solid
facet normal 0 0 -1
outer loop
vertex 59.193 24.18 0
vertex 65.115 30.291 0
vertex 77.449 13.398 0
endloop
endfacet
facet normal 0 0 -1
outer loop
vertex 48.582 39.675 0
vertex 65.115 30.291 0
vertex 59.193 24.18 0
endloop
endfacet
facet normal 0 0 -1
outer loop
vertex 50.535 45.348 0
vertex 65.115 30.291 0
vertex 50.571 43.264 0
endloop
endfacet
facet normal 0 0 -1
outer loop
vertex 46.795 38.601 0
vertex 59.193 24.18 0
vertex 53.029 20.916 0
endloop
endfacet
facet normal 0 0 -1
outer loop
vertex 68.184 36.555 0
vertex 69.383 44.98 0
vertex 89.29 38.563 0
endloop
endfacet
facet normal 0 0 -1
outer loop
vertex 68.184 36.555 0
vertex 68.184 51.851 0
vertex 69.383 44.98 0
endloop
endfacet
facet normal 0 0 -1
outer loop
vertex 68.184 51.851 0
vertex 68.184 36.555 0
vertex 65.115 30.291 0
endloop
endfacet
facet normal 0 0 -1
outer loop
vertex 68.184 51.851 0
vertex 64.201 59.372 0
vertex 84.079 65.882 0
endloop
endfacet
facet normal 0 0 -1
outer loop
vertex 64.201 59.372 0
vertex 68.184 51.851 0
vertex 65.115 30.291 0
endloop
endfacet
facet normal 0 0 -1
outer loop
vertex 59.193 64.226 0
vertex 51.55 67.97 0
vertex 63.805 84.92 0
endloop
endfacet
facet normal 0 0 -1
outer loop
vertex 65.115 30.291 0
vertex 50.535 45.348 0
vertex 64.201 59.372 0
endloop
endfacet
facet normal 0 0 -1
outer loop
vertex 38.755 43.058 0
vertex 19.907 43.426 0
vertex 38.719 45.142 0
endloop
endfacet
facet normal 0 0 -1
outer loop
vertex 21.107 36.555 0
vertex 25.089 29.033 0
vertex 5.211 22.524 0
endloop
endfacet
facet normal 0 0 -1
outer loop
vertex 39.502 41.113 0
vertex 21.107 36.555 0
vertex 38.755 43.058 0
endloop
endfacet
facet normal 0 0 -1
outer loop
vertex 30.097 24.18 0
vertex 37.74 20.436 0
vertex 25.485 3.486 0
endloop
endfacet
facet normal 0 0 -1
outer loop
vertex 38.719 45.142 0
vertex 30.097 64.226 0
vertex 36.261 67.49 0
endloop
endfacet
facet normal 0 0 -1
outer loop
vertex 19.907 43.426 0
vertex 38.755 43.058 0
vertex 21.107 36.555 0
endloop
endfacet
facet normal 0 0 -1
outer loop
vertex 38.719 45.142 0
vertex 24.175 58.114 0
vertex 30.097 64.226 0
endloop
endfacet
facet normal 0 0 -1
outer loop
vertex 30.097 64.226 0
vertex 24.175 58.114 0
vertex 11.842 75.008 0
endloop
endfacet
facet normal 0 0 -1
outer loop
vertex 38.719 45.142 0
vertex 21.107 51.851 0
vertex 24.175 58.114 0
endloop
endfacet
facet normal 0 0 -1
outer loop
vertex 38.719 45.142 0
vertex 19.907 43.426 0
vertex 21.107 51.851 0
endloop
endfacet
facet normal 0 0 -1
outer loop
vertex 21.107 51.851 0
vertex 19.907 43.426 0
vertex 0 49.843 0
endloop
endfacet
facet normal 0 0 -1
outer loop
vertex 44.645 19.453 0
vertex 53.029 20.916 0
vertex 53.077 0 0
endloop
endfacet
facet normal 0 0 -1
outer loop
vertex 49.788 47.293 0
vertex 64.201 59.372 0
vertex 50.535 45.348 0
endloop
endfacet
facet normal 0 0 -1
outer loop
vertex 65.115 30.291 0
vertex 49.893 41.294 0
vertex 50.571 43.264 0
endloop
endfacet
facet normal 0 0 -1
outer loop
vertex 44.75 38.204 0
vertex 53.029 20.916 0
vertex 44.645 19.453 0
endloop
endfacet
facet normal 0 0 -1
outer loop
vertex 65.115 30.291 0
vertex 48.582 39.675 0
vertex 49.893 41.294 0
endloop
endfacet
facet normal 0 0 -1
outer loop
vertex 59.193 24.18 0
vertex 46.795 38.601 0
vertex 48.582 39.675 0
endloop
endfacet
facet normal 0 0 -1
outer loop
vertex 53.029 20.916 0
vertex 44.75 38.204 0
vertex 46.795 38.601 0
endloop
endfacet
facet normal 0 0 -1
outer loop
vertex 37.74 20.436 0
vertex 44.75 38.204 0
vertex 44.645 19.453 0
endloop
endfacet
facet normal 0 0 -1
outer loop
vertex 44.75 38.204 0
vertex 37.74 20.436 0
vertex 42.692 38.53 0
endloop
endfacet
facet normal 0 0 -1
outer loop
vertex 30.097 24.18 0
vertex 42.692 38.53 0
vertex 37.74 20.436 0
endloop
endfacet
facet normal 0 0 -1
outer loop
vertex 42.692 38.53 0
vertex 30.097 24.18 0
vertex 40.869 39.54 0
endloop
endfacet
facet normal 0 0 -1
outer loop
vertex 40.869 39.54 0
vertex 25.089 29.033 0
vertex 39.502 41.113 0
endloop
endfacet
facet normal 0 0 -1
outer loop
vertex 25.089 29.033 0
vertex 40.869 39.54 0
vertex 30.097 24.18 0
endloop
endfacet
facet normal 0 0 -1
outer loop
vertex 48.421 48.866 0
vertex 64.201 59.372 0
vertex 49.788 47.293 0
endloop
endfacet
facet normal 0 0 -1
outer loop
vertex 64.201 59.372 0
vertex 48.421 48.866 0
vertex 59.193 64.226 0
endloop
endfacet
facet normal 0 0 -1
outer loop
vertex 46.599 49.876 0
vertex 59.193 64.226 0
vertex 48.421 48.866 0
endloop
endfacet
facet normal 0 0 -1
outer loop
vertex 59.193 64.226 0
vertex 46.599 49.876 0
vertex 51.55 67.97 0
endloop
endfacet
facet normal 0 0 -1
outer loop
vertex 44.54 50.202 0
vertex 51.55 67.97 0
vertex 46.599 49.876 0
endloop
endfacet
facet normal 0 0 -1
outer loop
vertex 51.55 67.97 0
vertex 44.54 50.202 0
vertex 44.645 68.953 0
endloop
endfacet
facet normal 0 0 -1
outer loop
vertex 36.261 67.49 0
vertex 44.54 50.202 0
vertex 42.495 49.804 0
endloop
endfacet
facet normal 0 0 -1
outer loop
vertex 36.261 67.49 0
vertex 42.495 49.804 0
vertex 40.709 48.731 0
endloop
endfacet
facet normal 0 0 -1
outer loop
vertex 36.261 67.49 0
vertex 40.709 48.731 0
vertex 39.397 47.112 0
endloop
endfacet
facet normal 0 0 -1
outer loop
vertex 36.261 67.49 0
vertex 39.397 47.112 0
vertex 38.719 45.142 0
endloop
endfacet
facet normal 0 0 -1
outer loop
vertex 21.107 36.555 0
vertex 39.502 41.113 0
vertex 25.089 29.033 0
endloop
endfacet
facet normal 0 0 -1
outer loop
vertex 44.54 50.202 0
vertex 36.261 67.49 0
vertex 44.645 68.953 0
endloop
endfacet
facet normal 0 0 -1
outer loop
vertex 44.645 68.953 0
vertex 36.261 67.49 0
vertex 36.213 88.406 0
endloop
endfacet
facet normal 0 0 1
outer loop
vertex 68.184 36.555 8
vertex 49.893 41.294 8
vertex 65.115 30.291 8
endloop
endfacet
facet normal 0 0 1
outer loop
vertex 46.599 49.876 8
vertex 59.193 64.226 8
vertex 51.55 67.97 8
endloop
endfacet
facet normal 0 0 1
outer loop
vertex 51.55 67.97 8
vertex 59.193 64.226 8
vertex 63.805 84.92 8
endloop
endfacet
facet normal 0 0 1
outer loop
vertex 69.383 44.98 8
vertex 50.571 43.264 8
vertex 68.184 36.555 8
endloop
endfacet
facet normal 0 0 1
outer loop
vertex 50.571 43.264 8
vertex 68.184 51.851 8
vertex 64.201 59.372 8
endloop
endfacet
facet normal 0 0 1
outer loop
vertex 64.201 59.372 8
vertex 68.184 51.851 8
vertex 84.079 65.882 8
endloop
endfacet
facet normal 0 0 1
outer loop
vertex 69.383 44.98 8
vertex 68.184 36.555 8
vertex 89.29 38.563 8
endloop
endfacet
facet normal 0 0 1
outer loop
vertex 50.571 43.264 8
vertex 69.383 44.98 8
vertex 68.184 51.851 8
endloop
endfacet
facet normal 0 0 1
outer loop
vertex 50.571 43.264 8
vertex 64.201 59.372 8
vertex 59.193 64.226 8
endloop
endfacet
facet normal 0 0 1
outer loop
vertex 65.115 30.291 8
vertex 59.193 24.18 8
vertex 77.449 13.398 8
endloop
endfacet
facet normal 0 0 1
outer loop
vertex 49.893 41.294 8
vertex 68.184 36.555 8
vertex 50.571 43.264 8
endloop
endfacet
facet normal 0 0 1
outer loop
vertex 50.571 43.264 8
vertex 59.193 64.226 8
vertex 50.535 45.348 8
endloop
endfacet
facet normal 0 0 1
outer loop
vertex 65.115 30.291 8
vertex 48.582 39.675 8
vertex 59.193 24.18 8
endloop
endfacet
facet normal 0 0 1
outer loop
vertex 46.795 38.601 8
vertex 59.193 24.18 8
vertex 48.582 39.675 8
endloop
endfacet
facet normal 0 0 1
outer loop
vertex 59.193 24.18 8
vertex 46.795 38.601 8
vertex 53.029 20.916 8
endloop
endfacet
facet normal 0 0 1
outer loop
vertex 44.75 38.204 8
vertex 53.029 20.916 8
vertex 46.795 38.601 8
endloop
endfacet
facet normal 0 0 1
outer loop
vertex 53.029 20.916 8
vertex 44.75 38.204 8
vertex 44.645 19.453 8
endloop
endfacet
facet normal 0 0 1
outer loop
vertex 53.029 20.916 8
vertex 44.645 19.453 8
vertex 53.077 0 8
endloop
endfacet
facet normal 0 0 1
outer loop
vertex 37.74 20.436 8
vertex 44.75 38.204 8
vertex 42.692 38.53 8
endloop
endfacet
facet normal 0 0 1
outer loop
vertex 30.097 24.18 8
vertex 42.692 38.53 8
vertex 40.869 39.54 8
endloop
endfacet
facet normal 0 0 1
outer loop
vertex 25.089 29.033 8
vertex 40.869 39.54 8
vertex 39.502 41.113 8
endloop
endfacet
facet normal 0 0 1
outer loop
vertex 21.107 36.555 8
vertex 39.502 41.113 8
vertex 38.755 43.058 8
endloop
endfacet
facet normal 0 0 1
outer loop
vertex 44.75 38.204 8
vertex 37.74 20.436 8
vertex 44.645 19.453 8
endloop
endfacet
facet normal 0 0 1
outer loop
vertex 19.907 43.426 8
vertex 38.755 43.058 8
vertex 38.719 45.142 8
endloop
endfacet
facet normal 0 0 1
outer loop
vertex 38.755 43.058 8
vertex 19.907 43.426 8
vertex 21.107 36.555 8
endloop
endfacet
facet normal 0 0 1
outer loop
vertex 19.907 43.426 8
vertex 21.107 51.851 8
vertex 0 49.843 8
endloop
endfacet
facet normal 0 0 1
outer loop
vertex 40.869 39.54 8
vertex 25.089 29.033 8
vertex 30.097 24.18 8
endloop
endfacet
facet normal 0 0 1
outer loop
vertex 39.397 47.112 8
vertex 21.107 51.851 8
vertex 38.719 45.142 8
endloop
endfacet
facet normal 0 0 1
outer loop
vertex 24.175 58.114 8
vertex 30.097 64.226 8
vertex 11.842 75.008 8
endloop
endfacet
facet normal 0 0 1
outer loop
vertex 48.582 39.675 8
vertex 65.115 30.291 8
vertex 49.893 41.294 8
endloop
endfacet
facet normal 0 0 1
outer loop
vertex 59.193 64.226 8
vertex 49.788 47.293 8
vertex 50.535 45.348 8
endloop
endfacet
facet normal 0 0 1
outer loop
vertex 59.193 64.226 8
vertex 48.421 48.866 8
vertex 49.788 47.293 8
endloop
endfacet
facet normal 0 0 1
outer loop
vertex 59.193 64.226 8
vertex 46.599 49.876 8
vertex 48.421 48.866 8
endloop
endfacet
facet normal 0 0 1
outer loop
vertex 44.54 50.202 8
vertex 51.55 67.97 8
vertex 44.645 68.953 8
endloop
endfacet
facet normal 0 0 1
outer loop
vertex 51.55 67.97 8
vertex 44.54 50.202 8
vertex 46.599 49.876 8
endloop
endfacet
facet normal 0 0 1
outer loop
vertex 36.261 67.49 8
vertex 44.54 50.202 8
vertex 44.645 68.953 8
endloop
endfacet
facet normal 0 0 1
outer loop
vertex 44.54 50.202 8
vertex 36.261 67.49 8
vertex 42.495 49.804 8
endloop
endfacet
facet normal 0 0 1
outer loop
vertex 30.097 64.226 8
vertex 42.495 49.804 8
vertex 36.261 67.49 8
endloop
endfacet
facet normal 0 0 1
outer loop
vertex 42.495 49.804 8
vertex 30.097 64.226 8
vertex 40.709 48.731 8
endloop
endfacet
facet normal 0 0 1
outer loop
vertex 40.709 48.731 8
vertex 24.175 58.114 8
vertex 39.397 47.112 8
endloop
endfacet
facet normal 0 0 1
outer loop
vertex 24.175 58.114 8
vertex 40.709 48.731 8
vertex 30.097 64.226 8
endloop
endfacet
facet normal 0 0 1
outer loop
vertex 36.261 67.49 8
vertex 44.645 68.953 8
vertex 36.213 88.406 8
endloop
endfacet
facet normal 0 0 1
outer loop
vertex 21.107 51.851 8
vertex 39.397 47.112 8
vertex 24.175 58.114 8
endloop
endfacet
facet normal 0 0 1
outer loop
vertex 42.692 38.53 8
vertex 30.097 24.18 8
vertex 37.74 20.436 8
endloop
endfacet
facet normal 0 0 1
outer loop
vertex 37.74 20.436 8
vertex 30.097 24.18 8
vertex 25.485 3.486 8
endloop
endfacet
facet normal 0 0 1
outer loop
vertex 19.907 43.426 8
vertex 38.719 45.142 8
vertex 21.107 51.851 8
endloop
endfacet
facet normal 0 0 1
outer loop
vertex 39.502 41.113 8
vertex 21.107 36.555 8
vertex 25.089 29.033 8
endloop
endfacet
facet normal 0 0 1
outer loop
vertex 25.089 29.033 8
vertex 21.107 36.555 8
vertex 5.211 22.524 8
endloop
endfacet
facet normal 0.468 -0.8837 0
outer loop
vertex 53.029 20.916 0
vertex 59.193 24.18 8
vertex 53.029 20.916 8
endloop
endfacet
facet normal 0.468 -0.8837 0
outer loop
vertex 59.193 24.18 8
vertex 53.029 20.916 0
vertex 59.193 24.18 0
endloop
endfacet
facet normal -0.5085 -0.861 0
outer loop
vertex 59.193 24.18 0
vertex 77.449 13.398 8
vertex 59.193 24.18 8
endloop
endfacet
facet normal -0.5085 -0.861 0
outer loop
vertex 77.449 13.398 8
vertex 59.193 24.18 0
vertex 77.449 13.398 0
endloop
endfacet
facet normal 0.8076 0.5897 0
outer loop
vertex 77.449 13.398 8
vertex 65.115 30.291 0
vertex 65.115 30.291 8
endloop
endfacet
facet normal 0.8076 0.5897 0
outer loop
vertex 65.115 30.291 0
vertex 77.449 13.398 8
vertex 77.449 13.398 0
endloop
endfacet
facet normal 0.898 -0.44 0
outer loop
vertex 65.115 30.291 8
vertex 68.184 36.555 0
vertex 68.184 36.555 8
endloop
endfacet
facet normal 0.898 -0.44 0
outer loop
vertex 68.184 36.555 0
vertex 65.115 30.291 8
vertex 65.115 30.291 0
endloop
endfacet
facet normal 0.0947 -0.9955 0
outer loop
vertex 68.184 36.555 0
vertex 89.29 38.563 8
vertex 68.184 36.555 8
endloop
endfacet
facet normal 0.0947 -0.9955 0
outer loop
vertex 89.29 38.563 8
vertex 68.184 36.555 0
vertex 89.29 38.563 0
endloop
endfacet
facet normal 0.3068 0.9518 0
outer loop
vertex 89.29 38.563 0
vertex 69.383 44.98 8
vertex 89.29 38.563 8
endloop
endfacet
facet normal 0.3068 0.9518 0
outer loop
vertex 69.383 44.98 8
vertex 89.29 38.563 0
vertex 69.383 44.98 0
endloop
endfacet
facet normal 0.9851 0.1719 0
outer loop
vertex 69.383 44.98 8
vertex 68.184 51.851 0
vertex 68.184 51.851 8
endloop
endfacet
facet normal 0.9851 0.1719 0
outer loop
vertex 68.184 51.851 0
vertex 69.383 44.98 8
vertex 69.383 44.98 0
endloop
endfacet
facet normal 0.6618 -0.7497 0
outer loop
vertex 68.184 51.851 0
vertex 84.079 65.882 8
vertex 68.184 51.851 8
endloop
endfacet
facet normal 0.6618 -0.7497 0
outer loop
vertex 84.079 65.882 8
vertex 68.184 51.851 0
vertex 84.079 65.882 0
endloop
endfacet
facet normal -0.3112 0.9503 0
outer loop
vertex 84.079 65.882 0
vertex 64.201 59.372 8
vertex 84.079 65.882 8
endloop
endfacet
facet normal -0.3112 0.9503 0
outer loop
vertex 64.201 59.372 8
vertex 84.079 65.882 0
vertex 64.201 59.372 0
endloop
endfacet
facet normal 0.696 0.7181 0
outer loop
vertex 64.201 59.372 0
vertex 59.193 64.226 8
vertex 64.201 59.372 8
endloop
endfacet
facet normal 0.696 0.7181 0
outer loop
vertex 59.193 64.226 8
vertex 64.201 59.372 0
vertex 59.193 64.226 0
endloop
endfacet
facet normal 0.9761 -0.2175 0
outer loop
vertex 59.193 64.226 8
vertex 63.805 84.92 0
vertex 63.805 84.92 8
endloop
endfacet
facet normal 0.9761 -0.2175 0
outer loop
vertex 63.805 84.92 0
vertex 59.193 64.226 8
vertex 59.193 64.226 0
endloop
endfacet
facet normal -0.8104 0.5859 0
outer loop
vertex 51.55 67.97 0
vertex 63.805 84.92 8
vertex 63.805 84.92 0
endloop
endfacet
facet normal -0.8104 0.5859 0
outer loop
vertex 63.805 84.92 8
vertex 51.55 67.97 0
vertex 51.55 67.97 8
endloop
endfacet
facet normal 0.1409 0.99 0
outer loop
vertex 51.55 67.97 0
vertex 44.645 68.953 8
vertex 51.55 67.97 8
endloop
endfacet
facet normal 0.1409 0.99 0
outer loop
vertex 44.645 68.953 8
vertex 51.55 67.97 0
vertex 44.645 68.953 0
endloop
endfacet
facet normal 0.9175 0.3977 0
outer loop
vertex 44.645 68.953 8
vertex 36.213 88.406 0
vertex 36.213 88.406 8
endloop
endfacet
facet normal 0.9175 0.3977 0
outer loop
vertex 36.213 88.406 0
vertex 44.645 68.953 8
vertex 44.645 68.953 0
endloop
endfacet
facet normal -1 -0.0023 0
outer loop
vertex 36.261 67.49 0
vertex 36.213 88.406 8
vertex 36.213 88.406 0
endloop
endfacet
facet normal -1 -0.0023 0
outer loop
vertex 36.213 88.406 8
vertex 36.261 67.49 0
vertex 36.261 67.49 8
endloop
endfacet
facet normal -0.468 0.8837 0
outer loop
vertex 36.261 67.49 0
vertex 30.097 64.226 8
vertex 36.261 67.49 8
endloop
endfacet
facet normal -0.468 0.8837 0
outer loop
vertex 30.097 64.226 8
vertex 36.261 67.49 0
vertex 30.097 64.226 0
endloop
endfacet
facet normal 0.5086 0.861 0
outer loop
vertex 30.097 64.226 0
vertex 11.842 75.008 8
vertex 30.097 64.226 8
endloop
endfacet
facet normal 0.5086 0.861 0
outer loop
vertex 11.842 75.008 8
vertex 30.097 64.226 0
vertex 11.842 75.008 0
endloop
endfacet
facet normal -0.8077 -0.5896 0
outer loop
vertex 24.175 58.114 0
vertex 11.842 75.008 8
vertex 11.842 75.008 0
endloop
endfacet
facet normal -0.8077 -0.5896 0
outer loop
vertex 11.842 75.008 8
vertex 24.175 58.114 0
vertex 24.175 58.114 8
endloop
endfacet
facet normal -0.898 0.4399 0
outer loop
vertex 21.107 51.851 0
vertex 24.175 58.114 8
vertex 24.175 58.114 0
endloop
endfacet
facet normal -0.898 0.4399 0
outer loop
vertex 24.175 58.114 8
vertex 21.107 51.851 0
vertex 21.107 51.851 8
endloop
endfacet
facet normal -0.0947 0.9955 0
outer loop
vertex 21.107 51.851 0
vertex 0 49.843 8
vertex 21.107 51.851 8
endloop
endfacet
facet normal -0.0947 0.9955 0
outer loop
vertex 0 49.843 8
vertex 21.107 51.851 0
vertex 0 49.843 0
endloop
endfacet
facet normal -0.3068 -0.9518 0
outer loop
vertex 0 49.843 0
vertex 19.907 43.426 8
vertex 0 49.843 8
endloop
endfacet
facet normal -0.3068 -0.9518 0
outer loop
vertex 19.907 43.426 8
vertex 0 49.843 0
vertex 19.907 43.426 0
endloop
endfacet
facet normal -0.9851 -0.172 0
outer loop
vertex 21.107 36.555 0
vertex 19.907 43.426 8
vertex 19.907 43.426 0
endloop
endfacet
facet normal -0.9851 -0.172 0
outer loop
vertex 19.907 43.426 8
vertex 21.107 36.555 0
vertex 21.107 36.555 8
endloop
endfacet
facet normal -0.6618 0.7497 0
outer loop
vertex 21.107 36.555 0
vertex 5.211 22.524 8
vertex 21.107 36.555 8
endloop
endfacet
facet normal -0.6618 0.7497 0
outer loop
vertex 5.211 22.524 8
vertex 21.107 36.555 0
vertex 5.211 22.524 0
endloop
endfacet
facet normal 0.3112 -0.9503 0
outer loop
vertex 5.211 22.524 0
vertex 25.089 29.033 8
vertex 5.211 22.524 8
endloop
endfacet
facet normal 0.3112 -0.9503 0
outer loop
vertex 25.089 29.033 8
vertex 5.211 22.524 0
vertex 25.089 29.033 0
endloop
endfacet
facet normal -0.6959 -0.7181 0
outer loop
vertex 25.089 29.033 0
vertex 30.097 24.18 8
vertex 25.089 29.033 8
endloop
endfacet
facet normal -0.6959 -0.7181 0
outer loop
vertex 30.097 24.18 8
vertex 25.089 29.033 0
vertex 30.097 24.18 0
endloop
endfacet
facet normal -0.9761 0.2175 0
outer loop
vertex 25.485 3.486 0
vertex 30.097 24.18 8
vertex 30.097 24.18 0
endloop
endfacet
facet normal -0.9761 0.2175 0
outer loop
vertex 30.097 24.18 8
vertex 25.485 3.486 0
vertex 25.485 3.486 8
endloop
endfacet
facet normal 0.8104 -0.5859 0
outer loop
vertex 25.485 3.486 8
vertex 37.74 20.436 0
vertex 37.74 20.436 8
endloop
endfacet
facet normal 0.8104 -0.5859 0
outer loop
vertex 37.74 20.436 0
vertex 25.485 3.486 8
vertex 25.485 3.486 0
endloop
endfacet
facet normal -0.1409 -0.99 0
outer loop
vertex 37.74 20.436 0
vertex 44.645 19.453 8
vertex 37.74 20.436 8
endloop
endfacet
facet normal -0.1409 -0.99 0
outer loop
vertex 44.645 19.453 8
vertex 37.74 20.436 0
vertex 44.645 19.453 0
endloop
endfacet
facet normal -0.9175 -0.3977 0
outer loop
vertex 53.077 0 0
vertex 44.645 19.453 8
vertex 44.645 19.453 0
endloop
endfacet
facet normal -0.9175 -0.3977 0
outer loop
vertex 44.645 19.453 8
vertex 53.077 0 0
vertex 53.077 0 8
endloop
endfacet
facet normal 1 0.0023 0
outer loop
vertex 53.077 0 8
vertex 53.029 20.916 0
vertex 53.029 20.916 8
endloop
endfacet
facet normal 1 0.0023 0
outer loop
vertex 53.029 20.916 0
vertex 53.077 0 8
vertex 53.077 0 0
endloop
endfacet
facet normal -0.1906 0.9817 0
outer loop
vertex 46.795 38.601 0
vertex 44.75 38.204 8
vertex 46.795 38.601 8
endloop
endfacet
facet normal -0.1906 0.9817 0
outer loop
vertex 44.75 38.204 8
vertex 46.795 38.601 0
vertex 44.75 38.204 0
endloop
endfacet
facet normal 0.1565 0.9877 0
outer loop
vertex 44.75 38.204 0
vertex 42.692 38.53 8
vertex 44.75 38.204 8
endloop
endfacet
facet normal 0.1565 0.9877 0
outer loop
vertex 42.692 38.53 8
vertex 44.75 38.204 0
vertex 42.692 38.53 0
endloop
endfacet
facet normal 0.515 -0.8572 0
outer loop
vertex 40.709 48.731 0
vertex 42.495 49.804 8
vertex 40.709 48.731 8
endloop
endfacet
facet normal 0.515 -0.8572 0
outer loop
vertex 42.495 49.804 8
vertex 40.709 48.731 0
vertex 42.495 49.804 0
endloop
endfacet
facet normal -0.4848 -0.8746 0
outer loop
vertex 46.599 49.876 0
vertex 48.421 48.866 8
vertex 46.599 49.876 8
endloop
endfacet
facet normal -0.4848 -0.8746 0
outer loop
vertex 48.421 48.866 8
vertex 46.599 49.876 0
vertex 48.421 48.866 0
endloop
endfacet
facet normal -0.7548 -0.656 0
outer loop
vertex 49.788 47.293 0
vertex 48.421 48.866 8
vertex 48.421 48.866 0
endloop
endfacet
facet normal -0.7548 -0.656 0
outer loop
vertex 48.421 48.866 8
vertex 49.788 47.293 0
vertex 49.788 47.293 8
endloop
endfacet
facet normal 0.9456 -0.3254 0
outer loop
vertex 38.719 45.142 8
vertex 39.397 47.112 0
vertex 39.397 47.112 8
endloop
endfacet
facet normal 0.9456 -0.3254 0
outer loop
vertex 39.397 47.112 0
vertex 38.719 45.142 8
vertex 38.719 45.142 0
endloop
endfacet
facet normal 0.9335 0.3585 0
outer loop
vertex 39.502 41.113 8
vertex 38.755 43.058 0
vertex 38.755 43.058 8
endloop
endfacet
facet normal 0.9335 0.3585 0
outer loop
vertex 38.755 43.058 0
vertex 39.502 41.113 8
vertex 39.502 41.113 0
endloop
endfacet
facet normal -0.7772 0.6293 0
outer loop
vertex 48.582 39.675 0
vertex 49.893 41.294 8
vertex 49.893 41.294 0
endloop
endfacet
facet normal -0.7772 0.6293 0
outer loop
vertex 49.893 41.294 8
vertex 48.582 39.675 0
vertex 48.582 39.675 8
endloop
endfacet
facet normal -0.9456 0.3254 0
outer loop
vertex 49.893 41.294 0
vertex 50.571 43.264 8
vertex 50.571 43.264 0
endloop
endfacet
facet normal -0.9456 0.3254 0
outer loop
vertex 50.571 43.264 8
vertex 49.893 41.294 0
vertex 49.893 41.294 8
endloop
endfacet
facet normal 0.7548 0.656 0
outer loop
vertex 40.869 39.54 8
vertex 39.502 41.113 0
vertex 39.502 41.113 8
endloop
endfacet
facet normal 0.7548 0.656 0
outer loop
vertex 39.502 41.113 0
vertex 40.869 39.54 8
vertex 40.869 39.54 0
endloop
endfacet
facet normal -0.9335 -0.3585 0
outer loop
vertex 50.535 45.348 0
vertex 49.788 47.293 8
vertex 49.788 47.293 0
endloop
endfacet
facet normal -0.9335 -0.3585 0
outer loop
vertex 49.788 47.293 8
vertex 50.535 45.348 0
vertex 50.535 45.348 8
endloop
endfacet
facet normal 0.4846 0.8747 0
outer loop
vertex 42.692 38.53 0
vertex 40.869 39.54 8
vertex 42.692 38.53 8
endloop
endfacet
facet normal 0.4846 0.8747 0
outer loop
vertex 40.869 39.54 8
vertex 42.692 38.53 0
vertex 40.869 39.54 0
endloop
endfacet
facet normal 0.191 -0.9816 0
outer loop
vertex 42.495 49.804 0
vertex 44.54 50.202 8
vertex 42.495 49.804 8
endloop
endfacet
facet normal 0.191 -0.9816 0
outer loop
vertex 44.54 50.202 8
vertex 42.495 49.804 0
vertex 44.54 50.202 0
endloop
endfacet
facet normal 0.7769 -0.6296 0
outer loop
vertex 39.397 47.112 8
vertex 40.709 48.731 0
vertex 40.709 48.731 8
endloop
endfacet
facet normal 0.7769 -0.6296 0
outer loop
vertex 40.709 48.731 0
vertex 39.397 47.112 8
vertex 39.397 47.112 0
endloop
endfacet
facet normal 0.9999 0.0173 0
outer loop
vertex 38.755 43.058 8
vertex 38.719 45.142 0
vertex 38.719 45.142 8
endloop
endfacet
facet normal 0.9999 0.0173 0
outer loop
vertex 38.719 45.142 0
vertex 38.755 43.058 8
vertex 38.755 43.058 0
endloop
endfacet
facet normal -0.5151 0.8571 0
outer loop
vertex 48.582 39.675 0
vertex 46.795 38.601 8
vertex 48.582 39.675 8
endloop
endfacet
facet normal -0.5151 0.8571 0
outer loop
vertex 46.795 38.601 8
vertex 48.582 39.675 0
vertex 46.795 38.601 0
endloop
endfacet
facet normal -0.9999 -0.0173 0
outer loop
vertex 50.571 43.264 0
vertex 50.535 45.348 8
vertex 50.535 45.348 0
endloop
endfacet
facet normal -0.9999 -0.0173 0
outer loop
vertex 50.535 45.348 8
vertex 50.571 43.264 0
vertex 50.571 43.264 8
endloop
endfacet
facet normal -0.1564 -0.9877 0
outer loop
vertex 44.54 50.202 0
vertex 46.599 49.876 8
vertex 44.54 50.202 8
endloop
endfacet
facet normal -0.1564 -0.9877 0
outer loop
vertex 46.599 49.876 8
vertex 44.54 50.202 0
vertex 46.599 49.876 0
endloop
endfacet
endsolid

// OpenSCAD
$fn = 32;

// ----------------------------------------------------------------------
// Star wheel: 10-point ratchet, R45
// ----------------------------------------------------------------------

// --- parameters (mm) ---
n_points = 10;            // number of points / teeth
r_out = 45;               // tip radius
r_in = 24.75;             // root radius
bore_r = 6;               // centre bore radius
plate_t = 8;              // plate thickness, Z (extrusion height)
bore_d = 12;              // centre bore diameter

profile = [[44.645, 68.953], [36.213, 88.406], [36.261, 67.49], [30.097, 64.226], [11.842, 75.008], [24.175, 58.114], [21.107, 51.851], [0, 49.843], [19.907, 43.426], [21.107, 36.555], [5.211, 22.524], [25.089, 29.033], [30.097, 24.18], [25.485, 3.486], [37.74, 20.436], [44.645, 19.453], [53.077, 0], [53.029, 20.916], [59.193, 24.18], [77.449, 13.398], [65.115, 30.291], [68.184, 36.555], [89.29, 38.563], [69.383, 44.98], [68.184, 51.851], [84.079, 65.882], [64.201, 59.372], [59.193, 64.226], [63.805, 84.92], [51.55, 67.97]];  // primary outline, 30 points, counter clockwise
void_1 = [[50.535, 45.348], [49.788, 47.293], [48.421, 48.866], [46.599, 49.876], [44.54, 50.202], [42.495, 49.804], [40.709, 48.731], [39.397, 47.112], [38.719, 45.142], [38.755, 43.058], [39.502, 41.113], [40.869, 39.54], [42.692, 38.53], [44.75, 38.204], [46.795, 38.601], [48.582, 39.675], [49.893, 41.294], [50.571, 43.264]];  // centre bore, 18 points

// --- the one profile operation ---
difference() {
  linear_extrude(height = plate_t) polygon(points = profile);
  translate([0, 0, -1])
    linear_extrude(height = plate_t + 2) polygon(points = void_1);
}
